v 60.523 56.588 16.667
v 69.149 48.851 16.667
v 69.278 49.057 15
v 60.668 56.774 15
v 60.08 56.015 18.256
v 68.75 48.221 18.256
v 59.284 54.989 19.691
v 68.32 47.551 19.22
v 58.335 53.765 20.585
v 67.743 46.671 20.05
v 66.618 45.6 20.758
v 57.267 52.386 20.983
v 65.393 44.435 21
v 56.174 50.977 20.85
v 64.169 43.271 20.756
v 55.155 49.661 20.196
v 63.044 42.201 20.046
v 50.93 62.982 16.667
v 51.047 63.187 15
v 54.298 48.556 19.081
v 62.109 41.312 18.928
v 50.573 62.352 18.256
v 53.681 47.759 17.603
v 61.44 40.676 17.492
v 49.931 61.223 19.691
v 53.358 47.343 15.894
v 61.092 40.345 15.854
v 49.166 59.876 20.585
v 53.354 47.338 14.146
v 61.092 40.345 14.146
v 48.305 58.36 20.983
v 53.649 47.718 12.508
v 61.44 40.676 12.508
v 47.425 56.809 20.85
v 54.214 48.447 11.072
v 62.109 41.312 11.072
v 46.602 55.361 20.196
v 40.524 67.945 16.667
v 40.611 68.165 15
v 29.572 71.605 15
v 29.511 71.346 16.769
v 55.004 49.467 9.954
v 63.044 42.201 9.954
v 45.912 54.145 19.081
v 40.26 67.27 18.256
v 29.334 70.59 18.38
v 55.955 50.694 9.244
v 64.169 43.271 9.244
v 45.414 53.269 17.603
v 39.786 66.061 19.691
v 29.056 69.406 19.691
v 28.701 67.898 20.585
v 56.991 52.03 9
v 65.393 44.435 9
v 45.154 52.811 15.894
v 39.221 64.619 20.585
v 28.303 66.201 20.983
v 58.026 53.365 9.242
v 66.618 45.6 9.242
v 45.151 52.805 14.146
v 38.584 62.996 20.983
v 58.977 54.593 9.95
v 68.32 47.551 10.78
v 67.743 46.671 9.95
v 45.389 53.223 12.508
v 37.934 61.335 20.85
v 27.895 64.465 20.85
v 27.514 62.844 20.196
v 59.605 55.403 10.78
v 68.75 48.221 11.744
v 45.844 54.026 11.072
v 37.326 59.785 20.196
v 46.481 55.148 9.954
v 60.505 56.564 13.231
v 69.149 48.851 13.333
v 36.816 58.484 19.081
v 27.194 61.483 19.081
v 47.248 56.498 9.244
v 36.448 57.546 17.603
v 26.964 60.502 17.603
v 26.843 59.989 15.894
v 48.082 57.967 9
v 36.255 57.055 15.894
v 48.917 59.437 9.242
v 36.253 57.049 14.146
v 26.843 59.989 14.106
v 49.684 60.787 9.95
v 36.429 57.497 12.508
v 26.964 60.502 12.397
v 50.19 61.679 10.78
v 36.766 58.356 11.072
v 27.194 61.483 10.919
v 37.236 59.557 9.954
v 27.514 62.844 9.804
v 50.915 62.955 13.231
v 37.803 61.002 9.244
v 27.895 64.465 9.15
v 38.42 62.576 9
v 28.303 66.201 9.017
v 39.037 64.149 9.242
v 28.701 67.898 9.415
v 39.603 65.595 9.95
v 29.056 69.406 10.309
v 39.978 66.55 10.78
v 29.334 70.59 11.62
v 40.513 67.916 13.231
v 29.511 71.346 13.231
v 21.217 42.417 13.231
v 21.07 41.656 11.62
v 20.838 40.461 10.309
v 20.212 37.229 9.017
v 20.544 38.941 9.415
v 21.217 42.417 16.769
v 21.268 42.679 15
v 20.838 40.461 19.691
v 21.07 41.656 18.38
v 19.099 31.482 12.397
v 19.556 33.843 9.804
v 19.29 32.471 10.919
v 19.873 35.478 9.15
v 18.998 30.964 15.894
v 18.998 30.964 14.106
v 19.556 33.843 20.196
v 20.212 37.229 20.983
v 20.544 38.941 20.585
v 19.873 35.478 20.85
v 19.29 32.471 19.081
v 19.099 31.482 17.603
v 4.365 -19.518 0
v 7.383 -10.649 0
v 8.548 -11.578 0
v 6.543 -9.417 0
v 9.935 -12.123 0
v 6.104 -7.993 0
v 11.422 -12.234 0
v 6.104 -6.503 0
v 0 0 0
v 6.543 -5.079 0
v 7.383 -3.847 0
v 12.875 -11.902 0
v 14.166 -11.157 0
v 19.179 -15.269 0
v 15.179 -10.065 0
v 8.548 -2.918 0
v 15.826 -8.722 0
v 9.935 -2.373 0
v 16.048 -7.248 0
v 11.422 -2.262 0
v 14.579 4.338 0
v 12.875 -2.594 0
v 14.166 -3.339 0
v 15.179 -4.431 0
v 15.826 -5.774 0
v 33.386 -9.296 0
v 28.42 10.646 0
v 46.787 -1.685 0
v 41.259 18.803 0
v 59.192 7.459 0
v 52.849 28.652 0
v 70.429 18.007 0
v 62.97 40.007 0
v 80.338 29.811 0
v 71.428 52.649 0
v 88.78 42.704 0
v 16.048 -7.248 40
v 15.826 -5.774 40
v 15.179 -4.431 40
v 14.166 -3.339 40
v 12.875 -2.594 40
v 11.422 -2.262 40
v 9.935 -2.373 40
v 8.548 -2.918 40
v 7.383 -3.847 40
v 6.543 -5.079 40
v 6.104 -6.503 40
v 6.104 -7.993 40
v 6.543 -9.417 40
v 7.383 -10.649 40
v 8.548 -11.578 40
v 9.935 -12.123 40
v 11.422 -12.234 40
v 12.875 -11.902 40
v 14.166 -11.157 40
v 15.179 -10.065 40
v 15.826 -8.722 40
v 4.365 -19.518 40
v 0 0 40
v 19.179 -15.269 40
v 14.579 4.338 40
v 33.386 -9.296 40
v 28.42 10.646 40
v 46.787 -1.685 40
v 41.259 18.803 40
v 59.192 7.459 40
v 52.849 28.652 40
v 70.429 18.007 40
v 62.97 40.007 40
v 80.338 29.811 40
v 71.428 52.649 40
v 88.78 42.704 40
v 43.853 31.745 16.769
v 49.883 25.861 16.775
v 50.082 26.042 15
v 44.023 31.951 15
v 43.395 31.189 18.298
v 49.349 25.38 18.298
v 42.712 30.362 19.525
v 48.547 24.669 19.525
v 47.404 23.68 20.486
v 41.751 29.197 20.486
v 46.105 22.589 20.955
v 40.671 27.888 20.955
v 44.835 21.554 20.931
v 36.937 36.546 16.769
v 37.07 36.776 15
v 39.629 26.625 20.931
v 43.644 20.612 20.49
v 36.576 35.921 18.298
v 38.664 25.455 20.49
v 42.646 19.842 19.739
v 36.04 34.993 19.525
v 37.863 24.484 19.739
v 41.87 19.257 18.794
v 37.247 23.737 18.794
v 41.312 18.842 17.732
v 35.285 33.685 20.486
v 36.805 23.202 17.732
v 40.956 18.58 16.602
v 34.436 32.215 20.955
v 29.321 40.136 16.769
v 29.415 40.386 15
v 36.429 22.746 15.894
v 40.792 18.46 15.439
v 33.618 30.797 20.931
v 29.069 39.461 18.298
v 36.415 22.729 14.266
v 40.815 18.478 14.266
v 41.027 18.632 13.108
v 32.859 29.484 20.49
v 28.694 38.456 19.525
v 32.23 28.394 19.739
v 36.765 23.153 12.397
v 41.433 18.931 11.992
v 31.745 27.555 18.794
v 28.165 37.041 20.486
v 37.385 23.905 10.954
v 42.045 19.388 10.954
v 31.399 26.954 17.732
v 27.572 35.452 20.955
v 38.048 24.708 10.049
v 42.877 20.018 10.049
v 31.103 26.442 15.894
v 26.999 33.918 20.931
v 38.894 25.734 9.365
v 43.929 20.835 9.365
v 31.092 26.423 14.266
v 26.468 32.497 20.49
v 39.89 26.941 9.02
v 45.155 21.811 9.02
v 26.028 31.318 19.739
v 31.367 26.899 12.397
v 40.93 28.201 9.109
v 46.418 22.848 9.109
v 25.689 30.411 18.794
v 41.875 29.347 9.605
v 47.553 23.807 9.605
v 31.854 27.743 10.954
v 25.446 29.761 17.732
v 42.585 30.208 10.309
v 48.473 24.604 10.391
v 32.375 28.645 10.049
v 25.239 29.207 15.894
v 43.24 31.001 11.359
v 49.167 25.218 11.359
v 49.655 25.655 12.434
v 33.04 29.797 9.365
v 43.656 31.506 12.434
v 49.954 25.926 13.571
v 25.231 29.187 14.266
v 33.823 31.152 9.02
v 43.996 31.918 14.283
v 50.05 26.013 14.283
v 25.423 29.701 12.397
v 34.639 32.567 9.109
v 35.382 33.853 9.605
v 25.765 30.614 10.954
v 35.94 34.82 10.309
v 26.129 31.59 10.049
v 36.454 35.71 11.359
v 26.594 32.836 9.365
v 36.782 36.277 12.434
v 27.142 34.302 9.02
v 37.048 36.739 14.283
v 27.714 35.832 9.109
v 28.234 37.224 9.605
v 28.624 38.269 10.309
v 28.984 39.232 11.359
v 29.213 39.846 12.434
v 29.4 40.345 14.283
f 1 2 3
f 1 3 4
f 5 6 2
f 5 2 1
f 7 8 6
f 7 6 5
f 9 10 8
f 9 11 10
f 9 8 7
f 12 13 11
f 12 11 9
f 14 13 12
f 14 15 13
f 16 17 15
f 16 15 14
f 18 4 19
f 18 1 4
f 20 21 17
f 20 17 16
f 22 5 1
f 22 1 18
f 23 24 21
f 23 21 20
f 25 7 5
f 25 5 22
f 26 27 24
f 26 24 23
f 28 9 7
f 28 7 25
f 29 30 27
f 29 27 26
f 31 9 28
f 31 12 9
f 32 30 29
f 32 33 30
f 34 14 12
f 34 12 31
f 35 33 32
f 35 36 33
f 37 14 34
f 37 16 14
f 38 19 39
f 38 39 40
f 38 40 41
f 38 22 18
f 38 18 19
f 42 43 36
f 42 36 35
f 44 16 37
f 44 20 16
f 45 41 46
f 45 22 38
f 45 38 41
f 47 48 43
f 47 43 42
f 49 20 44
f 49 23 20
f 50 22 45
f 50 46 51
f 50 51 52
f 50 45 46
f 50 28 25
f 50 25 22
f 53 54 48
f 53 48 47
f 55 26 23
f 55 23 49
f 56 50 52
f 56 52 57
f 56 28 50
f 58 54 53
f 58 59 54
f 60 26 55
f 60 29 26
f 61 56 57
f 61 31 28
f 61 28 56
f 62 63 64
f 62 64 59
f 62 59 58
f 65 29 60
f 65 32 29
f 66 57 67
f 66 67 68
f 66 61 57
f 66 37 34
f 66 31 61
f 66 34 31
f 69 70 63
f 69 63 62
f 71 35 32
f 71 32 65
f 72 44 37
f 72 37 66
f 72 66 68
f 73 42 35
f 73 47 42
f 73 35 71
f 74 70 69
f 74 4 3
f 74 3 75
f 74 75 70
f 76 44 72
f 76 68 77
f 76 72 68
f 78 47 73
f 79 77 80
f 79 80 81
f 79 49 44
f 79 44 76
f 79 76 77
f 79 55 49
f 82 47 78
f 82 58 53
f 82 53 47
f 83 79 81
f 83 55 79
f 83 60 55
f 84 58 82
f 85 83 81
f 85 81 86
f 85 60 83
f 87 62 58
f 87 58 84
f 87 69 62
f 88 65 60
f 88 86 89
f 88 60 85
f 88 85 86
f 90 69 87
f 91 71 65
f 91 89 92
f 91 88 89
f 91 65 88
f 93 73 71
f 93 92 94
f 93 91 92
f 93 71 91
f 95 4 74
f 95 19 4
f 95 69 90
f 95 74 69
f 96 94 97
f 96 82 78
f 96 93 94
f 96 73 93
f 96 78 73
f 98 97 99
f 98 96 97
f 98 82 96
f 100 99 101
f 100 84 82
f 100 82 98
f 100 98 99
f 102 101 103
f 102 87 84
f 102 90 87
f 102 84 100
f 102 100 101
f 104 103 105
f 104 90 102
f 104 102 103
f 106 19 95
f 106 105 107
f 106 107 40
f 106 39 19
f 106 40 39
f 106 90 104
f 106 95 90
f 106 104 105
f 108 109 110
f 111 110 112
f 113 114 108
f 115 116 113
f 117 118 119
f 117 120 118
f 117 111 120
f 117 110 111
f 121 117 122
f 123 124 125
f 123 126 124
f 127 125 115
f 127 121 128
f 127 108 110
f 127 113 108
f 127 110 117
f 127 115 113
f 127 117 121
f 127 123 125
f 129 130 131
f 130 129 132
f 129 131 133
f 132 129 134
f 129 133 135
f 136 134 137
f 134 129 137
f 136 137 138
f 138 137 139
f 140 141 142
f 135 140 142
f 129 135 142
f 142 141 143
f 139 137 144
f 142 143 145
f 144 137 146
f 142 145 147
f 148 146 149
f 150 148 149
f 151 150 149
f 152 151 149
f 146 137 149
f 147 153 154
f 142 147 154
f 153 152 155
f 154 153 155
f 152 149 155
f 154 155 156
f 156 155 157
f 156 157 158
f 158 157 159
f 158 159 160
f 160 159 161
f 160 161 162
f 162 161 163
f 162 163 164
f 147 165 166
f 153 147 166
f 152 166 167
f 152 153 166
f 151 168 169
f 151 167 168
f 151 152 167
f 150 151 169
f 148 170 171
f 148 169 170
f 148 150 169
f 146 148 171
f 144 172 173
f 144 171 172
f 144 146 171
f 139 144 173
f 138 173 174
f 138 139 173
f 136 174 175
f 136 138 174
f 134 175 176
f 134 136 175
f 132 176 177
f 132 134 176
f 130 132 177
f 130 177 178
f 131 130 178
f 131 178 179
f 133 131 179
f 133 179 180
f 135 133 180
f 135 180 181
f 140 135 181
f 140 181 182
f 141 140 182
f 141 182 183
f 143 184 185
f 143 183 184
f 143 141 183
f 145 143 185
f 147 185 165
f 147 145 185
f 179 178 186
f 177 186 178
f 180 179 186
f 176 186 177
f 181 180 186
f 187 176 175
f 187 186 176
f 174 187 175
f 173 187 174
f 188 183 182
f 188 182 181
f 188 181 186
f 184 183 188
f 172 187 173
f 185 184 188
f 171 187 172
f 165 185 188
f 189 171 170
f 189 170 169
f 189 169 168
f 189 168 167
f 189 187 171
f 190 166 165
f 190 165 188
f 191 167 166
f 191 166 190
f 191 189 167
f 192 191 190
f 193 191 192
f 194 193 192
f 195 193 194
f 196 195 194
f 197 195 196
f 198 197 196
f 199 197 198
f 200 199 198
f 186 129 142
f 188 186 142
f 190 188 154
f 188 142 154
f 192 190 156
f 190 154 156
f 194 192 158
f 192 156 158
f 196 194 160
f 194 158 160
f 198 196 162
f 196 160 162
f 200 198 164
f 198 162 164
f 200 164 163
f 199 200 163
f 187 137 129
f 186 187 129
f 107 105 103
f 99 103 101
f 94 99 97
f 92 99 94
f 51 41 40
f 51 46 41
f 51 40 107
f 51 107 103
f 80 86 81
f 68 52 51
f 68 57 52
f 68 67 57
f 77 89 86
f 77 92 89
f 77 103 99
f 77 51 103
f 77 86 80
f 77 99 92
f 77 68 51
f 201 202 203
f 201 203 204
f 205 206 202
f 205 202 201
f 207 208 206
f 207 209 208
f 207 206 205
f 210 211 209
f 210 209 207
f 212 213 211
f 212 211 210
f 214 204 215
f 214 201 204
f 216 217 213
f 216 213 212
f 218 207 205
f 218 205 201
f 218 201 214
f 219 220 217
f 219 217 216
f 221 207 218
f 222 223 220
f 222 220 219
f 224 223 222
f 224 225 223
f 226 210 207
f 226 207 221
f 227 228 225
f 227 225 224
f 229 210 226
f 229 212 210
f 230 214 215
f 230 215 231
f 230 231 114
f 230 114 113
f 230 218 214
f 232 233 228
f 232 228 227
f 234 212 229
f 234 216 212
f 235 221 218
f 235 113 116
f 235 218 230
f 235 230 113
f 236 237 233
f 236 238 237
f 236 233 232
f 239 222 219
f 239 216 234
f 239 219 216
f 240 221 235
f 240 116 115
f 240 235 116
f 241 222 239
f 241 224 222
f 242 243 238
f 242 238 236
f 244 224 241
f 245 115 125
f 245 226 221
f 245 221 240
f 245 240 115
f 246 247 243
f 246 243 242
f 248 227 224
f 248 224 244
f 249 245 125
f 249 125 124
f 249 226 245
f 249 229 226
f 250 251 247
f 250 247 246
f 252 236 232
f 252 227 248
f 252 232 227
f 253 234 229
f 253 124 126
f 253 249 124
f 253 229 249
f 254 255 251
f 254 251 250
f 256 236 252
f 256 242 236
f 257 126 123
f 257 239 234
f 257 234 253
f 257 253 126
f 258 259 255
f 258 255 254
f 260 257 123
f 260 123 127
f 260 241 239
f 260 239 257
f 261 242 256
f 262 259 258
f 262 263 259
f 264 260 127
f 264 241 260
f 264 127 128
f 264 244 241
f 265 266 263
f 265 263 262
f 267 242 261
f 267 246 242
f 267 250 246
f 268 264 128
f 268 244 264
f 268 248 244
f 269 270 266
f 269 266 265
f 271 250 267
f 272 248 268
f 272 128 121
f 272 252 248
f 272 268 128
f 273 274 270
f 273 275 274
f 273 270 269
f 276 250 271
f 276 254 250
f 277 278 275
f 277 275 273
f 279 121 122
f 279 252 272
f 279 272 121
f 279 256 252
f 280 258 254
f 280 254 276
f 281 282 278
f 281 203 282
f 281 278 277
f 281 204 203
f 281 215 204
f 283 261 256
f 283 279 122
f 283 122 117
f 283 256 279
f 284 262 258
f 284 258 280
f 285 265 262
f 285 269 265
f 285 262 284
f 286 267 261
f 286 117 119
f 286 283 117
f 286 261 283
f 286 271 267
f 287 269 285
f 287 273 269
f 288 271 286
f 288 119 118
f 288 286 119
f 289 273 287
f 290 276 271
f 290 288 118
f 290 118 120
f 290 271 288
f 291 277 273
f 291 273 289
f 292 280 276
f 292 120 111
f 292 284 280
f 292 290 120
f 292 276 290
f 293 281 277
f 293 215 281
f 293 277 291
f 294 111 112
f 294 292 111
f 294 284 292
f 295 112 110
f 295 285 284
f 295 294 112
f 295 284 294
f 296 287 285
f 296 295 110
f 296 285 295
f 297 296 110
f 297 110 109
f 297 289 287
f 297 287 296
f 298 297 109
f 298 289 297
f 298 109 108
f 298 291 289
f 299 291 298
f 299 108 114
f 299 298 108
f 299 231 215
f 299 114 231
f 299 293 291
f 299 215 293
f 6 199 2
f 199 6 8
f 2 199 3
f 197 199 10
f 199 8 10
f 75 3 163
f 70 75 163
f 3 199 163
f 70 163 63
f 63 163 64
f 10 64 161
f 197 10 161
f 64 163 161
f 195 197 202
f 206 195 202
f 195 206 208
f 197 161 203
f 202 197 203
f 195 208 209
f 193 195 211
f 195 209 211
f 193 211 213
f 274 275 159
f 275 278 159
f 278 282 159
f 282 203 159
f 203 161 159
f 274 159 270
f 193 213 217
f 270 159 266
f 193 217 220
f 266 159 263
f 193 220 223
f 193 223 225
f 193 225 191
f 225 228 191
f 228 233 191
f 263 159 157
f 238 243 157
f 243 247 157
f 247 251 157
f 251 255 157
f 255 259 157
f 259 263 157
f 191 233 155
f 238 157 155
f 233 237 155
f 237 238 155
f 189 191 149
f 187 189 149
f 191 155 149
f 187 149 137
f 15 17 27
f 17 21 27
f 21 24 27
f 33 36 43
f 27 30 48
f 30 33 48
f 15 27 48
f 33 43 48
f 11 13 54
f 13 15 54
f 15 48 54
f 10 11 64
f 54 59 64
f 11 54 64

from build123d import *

# Parameters (mm, degrees)
BOSS_EXTRUDE1_DEPTH     = 40
CUT_EXTRUDE1_DEPTH      = 111.69728555
CUT_EXTRUDE1_DEPTH_BACK = 111.69728555
SKETCH3_R               = 5
SWEEP3_PROFILE_R        = 6
SWEEP4_PROFILE_R        = 6


with BuildPart() as part:
    # Sketch1 → Boss-Extrude1 (new body)
    with BuildSketch(Plane.XY):
        with BuildLine():
            Line((0, 0), (4.364992014, -19.517859635))
            ThreePointArc((4.364992014, -19.517859635), (53.125172498, 2.703315983), (88.780401421, 42.703822193))
            Line((88.780401421, 42.703822193), (71.428423344, 52.649115393))
            ThreePointArc((71.428423344, 52.649115393), (41.258614256, 18.802533215), (0, 0))
        make_face()
    extrude(amount=BOSS_EXTRUDE1_DEPTH)

    # Sketch3 → Cut-Extrude1 (cut, two sides: drawn at the far end of the back side and taken through both)
    with BuildSketch(Plane.XY.offset(40).offset(-CUT_EXTRUDE1_DEPTH_BACK)):
        with Locations((11.048099116, -7.247975554)):
            Circle(SKETCH3_R)
    extrude(amount=CUT_EXTRUDE1_DEPTH + CUT_EXTRUDE1_DEPTH_BACK, mode=Mode.SUBTRACT)

    # Sweep3: sweep along a path in Sketch32
    with BuildLine(Plane.XY.offset(15)) as sweep3_path:
        ThreePointArc((65.395294118, 44.437442075), (48.35413652, 57.815528603), (28.200002322, 65.764435832))
    # Sweep3 profile (on start of the path) → Sweep3 (sweep)
    with BuildSketch(Plane(origin=(65.395294118, 44.437442075, 15), x_dir=(0.7246292666888544, 0.6891389017157377, 0), z_dir=(-0.6891389017157377, 0.7246292666888544, 0))):
        Circle(SWEEP3_PROFILE_R)
    sweep(path=sweep3_path.line)

    # Sweep4: sweep along a path in Sketch48
    with BuildLine(Plane.XY.offset(15)) as sweep4_path:
        ThreePointArc((51.136783714, 14.042285968), (38.184106553, 28.895053348), (20.126776716, 36.788682657))
    # Sweep4 profile (on start of the path) → Sweep4 (sweep)
    with BuildSketch(Plane(origin=(51.136783714, 14.042285968, 15), x_dir=(0.879297732143527, 0.47627250418982864, 0), z_dir=(-0.47627250418982864, 0.879297732143527, 0))):
        Circle(SWEEP4_PROFILE_R)
    sweep(path=sweep4_path.line)


solid = part.part
